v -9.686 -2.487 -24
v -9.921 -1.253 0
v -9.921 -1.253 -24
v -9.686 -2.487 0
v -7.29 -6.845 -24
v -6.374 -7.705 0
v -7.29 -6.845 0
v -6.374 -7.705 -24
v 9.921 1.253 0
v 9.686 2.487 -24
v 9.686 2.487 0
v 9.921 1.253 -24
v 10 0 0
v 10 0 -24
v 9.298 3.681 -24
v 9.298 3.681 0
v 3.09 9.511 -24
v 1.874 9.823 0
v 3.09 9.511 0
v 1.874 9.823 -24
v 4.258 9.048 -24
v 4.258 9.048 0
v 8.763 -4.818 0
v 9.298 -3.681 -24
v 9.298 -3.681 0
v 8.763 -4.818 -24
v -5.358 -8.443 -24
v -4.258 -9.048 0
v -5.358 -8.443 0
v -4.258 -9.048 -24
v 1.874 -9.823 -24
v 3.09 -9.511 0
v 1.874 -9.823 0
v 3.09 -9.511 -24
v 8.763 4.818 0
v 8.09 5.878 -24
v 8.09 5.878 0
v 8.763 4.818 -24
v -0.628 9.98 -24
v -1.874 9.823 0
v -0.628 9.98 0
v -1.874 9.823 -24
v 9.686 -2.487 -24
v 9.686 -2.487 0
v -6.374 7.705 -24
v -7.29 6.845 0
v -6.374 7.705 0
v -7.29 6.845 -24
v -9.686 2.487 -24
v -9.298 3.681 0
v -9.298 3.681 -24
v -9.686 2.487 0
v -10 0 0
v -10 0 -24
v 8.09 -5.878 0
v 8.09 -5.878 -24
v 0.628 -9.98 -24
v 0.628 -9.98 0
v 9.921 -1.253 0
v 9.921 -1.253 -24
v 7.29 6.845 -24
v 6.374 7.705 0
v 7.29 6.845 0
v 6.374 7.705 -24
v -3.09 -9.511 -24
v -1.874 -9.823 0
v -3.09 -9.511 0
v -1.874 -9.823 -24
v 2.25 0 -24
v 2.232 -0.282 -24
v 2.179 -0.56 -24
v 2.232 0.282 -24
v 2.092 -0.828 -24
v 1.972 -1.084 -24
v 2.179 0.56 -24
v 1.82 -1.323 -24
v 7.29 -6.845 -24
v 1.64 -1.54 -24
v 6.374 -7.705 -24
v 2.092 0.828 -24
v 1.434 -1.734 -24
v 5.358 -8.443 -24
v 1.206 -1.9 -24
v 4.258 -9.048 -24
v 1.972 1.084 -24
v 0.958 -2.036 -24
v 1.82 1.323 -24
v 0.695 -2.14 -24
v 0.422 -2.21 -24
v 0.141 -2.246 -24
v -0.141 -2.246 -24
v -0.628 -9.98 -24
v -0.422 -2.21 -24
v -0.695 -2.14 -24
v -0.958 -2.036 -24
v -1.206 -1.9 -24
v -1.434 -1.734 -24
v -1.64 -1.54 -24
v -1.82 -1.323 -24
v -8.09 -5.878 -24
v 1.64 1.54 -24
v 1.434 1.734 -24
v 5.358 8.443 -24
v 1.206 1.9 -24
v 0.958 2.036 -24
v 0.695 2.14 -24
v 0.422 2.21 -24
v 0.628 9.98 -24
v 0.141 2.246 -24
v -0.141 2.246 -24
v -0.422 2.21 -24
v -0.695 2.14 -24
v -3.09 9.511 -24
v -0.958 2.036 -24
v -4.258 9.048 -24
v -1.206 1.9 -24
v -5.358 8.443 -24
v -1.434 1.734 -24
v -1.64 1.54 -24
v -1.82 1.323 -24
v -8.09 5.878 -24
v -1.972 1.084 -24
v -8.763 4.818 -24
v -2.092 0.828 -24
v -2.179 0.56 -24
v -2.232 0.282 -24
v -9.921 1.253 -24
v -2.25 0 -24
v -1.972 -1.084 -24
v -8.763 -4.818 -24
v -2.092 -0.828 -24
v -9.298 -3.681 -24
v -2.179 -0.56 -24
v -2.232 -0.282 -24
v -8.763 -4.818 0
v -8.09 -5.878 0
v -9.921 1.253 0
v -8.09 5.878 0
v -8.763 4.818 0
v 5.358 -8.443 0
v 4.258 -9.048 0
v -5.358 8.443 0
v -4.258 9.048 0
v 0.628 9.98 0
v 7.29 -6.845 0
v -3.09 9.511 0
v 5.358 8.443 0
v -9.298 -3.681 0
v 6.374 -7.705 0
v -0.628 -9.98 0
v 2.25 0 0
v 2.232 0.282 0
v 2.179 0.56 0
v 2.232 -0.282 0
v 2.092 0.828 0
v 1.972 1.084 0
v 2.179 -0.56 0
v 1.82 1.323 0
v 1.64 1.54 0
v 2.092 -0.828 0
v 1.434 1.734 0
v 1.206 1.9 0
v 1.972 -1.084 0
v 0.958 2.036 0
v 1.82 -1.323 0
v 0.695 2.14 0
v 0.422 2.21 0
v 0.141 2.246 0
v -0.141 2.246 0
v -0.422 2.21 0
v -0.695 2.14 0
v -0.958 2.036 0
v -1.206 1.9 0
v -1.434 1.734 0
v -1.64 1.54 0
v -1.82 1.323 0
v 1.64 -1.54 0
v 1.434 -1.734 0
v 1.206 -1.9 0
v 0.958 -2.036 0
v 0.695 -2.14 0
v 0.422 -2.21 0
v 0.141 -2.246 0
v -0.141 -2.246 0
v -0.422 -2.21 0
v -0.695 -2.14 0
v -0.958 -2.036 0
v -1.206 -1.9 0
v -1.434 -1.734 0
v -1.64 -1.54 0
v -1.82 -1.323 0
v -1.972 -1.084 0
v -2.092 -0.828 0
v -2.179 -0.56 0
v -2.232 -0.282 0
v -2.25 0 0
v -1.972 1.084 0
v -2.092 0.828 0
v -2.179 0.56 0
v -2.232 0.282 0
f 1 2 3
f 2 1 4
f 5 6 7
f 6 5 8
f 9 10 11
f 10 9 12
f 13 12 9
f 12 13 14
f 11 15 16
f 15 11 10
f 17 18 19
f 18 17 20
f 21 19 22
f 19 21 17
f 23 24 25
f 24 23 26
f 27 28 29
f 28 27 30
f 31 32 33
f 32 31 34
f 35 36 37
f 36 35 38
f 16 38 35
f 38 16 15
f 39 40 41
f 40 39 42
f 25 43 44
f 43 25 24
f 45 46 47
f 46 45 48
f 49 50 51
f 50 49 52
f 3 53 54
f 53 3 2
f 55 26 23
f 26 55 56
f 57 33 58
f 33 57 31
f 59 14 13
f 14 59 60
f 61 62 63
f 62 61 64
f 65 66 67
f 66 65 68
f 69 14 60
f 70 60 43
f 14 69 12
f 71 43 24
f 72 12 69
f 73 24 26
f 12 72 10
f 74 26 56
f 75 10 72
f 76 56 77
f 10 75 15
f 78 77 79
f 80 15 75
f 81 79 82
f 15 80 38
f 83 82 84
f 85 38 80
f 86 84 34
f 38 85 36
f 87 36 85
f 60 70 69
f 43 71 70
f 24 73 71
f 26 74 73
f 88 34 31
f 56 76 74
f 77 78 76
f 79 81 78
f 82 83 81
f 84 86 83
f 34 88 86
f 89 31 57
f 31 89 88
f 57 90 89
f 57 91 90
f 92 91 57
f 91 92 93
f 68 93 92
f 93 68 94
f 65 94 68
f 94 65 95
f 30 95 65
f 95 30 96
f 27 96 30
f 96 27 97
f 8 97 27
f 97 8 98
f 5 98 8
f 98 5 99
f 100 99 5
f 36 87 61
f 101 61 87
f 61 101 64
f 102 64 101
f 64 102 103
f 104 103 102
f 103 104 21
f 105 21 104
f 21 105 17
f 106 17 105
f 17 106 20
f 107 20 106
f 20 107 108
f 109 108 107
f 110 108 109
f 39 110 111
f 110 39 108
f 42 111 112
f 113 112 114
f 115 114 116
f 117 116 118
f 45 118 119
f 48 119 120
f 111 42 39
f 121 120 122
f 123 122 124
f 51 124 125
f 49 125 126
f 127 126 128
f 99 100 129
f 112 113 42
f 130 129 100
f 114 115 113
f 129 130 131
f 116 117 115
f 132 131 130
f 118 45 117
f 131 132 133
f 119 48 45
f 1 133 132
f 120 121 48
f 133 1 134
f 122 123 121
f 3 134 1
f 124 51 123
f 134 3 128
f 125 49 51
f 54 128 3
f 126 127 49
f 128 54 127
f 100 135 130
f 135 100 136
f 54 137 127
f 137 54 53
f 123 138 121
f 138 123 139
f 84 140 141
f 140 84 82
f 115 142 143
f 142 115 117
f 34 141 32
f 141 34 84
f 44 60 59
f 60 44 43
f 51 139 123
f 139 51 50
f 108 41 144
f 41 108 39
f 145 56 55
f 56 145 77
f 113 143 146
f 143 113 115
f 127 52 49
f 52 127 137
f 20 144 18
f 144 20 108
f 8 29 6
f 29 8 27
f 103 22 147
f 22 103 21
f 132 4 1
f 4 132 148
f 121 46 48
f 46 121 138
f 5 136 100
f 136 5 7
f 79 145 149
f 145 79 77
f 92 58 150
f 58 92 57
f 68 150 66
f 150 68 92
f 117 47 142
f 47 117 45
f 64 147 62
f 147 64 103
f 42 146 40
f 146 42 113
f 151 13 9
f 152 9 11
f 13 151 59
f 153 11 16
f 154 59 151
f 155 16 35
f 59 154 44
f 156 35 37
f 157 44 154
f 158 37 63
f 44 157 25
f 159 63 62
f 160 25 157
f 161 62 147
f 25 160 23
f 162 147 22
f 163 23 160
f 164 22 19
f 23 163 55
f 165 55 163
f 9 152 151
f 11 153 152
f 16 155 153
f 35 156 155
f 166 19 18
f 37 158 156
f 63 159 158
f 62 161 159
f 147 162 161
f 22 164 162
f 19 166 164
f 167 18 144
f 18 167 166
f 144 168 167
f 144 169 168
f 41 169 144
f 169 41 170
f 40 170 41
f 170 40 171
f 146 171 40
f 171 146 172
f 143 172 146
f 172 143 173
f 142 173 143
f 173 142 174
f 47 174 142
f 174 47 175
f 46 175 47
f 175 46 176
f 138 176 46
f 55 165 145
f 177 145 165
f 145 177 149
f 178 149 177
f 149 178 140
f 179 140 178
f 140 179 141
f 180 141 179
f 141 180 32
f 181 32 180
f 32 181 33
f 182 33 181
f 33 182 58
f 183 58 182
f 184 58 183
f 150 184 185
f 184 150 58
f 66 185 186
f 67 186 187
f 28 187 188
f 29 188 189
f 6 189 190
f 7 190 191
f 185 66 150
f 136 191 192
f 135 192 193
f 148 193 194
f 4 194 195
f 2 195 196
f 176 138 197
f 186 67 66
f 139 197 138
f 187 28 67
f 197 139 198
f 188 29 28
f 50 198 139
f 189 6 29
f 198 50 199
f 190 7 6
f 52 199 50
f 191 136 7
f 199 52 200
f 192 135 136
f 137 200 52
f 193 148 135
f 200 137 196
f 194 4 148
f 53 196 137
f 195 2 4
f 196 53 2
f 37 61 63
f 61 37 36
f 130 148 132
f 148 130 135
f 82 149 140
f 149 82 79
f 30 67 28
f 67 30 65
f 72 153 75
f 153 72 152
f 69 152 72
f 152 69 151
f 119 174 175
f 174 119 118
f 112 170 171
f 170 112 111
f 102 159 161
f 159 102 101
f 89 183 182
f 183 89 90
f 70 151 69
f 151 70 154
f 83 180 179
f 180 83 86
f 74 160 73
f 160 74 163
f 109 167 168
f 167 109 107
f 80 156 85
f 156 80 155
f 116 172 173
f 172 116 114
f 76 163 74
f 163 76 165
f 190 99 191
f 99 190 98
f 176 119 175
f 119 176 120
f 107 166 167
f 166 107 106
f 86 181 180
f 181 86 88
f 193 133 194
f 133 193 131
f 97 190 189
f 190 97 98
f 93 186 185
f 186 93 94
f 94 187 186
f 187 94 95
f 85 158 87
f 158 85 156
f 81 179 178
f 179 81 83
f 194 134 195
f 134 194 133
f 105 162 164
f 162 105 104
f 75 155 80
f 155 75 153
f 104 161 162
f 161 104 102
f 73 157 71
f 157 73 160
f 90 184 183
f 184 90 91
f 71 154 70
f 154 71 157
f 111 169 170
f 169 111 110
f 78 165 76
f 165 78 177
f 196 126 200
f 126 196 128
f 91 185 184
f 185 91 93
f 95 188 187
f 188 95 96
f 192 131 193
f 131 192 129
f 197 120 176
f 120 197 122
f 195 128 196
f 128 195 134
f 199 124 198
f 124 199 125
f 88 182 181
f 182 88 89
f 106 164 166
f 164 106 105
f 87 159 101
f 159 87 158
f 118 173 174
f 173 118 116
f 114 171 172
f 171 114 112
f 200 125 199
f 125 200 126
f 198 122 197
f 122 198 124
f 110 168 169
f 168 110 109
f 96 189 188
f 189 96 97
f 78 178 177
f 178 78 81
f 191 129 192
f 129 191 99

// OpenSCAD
$fn = 50;


difference() {
	union() {
		translate(v = [0, 0, -24.0000000000]) {
			cylinder(h = 24, r = 10.0000000000);
		}
		cylinder(h = 0, r = 19.0000000000);
	}
	union() {
		#translate(v = [0, 0, -24]) {
			cylinder(h = 24, r = 2.2500000000);
		}
	}
}
